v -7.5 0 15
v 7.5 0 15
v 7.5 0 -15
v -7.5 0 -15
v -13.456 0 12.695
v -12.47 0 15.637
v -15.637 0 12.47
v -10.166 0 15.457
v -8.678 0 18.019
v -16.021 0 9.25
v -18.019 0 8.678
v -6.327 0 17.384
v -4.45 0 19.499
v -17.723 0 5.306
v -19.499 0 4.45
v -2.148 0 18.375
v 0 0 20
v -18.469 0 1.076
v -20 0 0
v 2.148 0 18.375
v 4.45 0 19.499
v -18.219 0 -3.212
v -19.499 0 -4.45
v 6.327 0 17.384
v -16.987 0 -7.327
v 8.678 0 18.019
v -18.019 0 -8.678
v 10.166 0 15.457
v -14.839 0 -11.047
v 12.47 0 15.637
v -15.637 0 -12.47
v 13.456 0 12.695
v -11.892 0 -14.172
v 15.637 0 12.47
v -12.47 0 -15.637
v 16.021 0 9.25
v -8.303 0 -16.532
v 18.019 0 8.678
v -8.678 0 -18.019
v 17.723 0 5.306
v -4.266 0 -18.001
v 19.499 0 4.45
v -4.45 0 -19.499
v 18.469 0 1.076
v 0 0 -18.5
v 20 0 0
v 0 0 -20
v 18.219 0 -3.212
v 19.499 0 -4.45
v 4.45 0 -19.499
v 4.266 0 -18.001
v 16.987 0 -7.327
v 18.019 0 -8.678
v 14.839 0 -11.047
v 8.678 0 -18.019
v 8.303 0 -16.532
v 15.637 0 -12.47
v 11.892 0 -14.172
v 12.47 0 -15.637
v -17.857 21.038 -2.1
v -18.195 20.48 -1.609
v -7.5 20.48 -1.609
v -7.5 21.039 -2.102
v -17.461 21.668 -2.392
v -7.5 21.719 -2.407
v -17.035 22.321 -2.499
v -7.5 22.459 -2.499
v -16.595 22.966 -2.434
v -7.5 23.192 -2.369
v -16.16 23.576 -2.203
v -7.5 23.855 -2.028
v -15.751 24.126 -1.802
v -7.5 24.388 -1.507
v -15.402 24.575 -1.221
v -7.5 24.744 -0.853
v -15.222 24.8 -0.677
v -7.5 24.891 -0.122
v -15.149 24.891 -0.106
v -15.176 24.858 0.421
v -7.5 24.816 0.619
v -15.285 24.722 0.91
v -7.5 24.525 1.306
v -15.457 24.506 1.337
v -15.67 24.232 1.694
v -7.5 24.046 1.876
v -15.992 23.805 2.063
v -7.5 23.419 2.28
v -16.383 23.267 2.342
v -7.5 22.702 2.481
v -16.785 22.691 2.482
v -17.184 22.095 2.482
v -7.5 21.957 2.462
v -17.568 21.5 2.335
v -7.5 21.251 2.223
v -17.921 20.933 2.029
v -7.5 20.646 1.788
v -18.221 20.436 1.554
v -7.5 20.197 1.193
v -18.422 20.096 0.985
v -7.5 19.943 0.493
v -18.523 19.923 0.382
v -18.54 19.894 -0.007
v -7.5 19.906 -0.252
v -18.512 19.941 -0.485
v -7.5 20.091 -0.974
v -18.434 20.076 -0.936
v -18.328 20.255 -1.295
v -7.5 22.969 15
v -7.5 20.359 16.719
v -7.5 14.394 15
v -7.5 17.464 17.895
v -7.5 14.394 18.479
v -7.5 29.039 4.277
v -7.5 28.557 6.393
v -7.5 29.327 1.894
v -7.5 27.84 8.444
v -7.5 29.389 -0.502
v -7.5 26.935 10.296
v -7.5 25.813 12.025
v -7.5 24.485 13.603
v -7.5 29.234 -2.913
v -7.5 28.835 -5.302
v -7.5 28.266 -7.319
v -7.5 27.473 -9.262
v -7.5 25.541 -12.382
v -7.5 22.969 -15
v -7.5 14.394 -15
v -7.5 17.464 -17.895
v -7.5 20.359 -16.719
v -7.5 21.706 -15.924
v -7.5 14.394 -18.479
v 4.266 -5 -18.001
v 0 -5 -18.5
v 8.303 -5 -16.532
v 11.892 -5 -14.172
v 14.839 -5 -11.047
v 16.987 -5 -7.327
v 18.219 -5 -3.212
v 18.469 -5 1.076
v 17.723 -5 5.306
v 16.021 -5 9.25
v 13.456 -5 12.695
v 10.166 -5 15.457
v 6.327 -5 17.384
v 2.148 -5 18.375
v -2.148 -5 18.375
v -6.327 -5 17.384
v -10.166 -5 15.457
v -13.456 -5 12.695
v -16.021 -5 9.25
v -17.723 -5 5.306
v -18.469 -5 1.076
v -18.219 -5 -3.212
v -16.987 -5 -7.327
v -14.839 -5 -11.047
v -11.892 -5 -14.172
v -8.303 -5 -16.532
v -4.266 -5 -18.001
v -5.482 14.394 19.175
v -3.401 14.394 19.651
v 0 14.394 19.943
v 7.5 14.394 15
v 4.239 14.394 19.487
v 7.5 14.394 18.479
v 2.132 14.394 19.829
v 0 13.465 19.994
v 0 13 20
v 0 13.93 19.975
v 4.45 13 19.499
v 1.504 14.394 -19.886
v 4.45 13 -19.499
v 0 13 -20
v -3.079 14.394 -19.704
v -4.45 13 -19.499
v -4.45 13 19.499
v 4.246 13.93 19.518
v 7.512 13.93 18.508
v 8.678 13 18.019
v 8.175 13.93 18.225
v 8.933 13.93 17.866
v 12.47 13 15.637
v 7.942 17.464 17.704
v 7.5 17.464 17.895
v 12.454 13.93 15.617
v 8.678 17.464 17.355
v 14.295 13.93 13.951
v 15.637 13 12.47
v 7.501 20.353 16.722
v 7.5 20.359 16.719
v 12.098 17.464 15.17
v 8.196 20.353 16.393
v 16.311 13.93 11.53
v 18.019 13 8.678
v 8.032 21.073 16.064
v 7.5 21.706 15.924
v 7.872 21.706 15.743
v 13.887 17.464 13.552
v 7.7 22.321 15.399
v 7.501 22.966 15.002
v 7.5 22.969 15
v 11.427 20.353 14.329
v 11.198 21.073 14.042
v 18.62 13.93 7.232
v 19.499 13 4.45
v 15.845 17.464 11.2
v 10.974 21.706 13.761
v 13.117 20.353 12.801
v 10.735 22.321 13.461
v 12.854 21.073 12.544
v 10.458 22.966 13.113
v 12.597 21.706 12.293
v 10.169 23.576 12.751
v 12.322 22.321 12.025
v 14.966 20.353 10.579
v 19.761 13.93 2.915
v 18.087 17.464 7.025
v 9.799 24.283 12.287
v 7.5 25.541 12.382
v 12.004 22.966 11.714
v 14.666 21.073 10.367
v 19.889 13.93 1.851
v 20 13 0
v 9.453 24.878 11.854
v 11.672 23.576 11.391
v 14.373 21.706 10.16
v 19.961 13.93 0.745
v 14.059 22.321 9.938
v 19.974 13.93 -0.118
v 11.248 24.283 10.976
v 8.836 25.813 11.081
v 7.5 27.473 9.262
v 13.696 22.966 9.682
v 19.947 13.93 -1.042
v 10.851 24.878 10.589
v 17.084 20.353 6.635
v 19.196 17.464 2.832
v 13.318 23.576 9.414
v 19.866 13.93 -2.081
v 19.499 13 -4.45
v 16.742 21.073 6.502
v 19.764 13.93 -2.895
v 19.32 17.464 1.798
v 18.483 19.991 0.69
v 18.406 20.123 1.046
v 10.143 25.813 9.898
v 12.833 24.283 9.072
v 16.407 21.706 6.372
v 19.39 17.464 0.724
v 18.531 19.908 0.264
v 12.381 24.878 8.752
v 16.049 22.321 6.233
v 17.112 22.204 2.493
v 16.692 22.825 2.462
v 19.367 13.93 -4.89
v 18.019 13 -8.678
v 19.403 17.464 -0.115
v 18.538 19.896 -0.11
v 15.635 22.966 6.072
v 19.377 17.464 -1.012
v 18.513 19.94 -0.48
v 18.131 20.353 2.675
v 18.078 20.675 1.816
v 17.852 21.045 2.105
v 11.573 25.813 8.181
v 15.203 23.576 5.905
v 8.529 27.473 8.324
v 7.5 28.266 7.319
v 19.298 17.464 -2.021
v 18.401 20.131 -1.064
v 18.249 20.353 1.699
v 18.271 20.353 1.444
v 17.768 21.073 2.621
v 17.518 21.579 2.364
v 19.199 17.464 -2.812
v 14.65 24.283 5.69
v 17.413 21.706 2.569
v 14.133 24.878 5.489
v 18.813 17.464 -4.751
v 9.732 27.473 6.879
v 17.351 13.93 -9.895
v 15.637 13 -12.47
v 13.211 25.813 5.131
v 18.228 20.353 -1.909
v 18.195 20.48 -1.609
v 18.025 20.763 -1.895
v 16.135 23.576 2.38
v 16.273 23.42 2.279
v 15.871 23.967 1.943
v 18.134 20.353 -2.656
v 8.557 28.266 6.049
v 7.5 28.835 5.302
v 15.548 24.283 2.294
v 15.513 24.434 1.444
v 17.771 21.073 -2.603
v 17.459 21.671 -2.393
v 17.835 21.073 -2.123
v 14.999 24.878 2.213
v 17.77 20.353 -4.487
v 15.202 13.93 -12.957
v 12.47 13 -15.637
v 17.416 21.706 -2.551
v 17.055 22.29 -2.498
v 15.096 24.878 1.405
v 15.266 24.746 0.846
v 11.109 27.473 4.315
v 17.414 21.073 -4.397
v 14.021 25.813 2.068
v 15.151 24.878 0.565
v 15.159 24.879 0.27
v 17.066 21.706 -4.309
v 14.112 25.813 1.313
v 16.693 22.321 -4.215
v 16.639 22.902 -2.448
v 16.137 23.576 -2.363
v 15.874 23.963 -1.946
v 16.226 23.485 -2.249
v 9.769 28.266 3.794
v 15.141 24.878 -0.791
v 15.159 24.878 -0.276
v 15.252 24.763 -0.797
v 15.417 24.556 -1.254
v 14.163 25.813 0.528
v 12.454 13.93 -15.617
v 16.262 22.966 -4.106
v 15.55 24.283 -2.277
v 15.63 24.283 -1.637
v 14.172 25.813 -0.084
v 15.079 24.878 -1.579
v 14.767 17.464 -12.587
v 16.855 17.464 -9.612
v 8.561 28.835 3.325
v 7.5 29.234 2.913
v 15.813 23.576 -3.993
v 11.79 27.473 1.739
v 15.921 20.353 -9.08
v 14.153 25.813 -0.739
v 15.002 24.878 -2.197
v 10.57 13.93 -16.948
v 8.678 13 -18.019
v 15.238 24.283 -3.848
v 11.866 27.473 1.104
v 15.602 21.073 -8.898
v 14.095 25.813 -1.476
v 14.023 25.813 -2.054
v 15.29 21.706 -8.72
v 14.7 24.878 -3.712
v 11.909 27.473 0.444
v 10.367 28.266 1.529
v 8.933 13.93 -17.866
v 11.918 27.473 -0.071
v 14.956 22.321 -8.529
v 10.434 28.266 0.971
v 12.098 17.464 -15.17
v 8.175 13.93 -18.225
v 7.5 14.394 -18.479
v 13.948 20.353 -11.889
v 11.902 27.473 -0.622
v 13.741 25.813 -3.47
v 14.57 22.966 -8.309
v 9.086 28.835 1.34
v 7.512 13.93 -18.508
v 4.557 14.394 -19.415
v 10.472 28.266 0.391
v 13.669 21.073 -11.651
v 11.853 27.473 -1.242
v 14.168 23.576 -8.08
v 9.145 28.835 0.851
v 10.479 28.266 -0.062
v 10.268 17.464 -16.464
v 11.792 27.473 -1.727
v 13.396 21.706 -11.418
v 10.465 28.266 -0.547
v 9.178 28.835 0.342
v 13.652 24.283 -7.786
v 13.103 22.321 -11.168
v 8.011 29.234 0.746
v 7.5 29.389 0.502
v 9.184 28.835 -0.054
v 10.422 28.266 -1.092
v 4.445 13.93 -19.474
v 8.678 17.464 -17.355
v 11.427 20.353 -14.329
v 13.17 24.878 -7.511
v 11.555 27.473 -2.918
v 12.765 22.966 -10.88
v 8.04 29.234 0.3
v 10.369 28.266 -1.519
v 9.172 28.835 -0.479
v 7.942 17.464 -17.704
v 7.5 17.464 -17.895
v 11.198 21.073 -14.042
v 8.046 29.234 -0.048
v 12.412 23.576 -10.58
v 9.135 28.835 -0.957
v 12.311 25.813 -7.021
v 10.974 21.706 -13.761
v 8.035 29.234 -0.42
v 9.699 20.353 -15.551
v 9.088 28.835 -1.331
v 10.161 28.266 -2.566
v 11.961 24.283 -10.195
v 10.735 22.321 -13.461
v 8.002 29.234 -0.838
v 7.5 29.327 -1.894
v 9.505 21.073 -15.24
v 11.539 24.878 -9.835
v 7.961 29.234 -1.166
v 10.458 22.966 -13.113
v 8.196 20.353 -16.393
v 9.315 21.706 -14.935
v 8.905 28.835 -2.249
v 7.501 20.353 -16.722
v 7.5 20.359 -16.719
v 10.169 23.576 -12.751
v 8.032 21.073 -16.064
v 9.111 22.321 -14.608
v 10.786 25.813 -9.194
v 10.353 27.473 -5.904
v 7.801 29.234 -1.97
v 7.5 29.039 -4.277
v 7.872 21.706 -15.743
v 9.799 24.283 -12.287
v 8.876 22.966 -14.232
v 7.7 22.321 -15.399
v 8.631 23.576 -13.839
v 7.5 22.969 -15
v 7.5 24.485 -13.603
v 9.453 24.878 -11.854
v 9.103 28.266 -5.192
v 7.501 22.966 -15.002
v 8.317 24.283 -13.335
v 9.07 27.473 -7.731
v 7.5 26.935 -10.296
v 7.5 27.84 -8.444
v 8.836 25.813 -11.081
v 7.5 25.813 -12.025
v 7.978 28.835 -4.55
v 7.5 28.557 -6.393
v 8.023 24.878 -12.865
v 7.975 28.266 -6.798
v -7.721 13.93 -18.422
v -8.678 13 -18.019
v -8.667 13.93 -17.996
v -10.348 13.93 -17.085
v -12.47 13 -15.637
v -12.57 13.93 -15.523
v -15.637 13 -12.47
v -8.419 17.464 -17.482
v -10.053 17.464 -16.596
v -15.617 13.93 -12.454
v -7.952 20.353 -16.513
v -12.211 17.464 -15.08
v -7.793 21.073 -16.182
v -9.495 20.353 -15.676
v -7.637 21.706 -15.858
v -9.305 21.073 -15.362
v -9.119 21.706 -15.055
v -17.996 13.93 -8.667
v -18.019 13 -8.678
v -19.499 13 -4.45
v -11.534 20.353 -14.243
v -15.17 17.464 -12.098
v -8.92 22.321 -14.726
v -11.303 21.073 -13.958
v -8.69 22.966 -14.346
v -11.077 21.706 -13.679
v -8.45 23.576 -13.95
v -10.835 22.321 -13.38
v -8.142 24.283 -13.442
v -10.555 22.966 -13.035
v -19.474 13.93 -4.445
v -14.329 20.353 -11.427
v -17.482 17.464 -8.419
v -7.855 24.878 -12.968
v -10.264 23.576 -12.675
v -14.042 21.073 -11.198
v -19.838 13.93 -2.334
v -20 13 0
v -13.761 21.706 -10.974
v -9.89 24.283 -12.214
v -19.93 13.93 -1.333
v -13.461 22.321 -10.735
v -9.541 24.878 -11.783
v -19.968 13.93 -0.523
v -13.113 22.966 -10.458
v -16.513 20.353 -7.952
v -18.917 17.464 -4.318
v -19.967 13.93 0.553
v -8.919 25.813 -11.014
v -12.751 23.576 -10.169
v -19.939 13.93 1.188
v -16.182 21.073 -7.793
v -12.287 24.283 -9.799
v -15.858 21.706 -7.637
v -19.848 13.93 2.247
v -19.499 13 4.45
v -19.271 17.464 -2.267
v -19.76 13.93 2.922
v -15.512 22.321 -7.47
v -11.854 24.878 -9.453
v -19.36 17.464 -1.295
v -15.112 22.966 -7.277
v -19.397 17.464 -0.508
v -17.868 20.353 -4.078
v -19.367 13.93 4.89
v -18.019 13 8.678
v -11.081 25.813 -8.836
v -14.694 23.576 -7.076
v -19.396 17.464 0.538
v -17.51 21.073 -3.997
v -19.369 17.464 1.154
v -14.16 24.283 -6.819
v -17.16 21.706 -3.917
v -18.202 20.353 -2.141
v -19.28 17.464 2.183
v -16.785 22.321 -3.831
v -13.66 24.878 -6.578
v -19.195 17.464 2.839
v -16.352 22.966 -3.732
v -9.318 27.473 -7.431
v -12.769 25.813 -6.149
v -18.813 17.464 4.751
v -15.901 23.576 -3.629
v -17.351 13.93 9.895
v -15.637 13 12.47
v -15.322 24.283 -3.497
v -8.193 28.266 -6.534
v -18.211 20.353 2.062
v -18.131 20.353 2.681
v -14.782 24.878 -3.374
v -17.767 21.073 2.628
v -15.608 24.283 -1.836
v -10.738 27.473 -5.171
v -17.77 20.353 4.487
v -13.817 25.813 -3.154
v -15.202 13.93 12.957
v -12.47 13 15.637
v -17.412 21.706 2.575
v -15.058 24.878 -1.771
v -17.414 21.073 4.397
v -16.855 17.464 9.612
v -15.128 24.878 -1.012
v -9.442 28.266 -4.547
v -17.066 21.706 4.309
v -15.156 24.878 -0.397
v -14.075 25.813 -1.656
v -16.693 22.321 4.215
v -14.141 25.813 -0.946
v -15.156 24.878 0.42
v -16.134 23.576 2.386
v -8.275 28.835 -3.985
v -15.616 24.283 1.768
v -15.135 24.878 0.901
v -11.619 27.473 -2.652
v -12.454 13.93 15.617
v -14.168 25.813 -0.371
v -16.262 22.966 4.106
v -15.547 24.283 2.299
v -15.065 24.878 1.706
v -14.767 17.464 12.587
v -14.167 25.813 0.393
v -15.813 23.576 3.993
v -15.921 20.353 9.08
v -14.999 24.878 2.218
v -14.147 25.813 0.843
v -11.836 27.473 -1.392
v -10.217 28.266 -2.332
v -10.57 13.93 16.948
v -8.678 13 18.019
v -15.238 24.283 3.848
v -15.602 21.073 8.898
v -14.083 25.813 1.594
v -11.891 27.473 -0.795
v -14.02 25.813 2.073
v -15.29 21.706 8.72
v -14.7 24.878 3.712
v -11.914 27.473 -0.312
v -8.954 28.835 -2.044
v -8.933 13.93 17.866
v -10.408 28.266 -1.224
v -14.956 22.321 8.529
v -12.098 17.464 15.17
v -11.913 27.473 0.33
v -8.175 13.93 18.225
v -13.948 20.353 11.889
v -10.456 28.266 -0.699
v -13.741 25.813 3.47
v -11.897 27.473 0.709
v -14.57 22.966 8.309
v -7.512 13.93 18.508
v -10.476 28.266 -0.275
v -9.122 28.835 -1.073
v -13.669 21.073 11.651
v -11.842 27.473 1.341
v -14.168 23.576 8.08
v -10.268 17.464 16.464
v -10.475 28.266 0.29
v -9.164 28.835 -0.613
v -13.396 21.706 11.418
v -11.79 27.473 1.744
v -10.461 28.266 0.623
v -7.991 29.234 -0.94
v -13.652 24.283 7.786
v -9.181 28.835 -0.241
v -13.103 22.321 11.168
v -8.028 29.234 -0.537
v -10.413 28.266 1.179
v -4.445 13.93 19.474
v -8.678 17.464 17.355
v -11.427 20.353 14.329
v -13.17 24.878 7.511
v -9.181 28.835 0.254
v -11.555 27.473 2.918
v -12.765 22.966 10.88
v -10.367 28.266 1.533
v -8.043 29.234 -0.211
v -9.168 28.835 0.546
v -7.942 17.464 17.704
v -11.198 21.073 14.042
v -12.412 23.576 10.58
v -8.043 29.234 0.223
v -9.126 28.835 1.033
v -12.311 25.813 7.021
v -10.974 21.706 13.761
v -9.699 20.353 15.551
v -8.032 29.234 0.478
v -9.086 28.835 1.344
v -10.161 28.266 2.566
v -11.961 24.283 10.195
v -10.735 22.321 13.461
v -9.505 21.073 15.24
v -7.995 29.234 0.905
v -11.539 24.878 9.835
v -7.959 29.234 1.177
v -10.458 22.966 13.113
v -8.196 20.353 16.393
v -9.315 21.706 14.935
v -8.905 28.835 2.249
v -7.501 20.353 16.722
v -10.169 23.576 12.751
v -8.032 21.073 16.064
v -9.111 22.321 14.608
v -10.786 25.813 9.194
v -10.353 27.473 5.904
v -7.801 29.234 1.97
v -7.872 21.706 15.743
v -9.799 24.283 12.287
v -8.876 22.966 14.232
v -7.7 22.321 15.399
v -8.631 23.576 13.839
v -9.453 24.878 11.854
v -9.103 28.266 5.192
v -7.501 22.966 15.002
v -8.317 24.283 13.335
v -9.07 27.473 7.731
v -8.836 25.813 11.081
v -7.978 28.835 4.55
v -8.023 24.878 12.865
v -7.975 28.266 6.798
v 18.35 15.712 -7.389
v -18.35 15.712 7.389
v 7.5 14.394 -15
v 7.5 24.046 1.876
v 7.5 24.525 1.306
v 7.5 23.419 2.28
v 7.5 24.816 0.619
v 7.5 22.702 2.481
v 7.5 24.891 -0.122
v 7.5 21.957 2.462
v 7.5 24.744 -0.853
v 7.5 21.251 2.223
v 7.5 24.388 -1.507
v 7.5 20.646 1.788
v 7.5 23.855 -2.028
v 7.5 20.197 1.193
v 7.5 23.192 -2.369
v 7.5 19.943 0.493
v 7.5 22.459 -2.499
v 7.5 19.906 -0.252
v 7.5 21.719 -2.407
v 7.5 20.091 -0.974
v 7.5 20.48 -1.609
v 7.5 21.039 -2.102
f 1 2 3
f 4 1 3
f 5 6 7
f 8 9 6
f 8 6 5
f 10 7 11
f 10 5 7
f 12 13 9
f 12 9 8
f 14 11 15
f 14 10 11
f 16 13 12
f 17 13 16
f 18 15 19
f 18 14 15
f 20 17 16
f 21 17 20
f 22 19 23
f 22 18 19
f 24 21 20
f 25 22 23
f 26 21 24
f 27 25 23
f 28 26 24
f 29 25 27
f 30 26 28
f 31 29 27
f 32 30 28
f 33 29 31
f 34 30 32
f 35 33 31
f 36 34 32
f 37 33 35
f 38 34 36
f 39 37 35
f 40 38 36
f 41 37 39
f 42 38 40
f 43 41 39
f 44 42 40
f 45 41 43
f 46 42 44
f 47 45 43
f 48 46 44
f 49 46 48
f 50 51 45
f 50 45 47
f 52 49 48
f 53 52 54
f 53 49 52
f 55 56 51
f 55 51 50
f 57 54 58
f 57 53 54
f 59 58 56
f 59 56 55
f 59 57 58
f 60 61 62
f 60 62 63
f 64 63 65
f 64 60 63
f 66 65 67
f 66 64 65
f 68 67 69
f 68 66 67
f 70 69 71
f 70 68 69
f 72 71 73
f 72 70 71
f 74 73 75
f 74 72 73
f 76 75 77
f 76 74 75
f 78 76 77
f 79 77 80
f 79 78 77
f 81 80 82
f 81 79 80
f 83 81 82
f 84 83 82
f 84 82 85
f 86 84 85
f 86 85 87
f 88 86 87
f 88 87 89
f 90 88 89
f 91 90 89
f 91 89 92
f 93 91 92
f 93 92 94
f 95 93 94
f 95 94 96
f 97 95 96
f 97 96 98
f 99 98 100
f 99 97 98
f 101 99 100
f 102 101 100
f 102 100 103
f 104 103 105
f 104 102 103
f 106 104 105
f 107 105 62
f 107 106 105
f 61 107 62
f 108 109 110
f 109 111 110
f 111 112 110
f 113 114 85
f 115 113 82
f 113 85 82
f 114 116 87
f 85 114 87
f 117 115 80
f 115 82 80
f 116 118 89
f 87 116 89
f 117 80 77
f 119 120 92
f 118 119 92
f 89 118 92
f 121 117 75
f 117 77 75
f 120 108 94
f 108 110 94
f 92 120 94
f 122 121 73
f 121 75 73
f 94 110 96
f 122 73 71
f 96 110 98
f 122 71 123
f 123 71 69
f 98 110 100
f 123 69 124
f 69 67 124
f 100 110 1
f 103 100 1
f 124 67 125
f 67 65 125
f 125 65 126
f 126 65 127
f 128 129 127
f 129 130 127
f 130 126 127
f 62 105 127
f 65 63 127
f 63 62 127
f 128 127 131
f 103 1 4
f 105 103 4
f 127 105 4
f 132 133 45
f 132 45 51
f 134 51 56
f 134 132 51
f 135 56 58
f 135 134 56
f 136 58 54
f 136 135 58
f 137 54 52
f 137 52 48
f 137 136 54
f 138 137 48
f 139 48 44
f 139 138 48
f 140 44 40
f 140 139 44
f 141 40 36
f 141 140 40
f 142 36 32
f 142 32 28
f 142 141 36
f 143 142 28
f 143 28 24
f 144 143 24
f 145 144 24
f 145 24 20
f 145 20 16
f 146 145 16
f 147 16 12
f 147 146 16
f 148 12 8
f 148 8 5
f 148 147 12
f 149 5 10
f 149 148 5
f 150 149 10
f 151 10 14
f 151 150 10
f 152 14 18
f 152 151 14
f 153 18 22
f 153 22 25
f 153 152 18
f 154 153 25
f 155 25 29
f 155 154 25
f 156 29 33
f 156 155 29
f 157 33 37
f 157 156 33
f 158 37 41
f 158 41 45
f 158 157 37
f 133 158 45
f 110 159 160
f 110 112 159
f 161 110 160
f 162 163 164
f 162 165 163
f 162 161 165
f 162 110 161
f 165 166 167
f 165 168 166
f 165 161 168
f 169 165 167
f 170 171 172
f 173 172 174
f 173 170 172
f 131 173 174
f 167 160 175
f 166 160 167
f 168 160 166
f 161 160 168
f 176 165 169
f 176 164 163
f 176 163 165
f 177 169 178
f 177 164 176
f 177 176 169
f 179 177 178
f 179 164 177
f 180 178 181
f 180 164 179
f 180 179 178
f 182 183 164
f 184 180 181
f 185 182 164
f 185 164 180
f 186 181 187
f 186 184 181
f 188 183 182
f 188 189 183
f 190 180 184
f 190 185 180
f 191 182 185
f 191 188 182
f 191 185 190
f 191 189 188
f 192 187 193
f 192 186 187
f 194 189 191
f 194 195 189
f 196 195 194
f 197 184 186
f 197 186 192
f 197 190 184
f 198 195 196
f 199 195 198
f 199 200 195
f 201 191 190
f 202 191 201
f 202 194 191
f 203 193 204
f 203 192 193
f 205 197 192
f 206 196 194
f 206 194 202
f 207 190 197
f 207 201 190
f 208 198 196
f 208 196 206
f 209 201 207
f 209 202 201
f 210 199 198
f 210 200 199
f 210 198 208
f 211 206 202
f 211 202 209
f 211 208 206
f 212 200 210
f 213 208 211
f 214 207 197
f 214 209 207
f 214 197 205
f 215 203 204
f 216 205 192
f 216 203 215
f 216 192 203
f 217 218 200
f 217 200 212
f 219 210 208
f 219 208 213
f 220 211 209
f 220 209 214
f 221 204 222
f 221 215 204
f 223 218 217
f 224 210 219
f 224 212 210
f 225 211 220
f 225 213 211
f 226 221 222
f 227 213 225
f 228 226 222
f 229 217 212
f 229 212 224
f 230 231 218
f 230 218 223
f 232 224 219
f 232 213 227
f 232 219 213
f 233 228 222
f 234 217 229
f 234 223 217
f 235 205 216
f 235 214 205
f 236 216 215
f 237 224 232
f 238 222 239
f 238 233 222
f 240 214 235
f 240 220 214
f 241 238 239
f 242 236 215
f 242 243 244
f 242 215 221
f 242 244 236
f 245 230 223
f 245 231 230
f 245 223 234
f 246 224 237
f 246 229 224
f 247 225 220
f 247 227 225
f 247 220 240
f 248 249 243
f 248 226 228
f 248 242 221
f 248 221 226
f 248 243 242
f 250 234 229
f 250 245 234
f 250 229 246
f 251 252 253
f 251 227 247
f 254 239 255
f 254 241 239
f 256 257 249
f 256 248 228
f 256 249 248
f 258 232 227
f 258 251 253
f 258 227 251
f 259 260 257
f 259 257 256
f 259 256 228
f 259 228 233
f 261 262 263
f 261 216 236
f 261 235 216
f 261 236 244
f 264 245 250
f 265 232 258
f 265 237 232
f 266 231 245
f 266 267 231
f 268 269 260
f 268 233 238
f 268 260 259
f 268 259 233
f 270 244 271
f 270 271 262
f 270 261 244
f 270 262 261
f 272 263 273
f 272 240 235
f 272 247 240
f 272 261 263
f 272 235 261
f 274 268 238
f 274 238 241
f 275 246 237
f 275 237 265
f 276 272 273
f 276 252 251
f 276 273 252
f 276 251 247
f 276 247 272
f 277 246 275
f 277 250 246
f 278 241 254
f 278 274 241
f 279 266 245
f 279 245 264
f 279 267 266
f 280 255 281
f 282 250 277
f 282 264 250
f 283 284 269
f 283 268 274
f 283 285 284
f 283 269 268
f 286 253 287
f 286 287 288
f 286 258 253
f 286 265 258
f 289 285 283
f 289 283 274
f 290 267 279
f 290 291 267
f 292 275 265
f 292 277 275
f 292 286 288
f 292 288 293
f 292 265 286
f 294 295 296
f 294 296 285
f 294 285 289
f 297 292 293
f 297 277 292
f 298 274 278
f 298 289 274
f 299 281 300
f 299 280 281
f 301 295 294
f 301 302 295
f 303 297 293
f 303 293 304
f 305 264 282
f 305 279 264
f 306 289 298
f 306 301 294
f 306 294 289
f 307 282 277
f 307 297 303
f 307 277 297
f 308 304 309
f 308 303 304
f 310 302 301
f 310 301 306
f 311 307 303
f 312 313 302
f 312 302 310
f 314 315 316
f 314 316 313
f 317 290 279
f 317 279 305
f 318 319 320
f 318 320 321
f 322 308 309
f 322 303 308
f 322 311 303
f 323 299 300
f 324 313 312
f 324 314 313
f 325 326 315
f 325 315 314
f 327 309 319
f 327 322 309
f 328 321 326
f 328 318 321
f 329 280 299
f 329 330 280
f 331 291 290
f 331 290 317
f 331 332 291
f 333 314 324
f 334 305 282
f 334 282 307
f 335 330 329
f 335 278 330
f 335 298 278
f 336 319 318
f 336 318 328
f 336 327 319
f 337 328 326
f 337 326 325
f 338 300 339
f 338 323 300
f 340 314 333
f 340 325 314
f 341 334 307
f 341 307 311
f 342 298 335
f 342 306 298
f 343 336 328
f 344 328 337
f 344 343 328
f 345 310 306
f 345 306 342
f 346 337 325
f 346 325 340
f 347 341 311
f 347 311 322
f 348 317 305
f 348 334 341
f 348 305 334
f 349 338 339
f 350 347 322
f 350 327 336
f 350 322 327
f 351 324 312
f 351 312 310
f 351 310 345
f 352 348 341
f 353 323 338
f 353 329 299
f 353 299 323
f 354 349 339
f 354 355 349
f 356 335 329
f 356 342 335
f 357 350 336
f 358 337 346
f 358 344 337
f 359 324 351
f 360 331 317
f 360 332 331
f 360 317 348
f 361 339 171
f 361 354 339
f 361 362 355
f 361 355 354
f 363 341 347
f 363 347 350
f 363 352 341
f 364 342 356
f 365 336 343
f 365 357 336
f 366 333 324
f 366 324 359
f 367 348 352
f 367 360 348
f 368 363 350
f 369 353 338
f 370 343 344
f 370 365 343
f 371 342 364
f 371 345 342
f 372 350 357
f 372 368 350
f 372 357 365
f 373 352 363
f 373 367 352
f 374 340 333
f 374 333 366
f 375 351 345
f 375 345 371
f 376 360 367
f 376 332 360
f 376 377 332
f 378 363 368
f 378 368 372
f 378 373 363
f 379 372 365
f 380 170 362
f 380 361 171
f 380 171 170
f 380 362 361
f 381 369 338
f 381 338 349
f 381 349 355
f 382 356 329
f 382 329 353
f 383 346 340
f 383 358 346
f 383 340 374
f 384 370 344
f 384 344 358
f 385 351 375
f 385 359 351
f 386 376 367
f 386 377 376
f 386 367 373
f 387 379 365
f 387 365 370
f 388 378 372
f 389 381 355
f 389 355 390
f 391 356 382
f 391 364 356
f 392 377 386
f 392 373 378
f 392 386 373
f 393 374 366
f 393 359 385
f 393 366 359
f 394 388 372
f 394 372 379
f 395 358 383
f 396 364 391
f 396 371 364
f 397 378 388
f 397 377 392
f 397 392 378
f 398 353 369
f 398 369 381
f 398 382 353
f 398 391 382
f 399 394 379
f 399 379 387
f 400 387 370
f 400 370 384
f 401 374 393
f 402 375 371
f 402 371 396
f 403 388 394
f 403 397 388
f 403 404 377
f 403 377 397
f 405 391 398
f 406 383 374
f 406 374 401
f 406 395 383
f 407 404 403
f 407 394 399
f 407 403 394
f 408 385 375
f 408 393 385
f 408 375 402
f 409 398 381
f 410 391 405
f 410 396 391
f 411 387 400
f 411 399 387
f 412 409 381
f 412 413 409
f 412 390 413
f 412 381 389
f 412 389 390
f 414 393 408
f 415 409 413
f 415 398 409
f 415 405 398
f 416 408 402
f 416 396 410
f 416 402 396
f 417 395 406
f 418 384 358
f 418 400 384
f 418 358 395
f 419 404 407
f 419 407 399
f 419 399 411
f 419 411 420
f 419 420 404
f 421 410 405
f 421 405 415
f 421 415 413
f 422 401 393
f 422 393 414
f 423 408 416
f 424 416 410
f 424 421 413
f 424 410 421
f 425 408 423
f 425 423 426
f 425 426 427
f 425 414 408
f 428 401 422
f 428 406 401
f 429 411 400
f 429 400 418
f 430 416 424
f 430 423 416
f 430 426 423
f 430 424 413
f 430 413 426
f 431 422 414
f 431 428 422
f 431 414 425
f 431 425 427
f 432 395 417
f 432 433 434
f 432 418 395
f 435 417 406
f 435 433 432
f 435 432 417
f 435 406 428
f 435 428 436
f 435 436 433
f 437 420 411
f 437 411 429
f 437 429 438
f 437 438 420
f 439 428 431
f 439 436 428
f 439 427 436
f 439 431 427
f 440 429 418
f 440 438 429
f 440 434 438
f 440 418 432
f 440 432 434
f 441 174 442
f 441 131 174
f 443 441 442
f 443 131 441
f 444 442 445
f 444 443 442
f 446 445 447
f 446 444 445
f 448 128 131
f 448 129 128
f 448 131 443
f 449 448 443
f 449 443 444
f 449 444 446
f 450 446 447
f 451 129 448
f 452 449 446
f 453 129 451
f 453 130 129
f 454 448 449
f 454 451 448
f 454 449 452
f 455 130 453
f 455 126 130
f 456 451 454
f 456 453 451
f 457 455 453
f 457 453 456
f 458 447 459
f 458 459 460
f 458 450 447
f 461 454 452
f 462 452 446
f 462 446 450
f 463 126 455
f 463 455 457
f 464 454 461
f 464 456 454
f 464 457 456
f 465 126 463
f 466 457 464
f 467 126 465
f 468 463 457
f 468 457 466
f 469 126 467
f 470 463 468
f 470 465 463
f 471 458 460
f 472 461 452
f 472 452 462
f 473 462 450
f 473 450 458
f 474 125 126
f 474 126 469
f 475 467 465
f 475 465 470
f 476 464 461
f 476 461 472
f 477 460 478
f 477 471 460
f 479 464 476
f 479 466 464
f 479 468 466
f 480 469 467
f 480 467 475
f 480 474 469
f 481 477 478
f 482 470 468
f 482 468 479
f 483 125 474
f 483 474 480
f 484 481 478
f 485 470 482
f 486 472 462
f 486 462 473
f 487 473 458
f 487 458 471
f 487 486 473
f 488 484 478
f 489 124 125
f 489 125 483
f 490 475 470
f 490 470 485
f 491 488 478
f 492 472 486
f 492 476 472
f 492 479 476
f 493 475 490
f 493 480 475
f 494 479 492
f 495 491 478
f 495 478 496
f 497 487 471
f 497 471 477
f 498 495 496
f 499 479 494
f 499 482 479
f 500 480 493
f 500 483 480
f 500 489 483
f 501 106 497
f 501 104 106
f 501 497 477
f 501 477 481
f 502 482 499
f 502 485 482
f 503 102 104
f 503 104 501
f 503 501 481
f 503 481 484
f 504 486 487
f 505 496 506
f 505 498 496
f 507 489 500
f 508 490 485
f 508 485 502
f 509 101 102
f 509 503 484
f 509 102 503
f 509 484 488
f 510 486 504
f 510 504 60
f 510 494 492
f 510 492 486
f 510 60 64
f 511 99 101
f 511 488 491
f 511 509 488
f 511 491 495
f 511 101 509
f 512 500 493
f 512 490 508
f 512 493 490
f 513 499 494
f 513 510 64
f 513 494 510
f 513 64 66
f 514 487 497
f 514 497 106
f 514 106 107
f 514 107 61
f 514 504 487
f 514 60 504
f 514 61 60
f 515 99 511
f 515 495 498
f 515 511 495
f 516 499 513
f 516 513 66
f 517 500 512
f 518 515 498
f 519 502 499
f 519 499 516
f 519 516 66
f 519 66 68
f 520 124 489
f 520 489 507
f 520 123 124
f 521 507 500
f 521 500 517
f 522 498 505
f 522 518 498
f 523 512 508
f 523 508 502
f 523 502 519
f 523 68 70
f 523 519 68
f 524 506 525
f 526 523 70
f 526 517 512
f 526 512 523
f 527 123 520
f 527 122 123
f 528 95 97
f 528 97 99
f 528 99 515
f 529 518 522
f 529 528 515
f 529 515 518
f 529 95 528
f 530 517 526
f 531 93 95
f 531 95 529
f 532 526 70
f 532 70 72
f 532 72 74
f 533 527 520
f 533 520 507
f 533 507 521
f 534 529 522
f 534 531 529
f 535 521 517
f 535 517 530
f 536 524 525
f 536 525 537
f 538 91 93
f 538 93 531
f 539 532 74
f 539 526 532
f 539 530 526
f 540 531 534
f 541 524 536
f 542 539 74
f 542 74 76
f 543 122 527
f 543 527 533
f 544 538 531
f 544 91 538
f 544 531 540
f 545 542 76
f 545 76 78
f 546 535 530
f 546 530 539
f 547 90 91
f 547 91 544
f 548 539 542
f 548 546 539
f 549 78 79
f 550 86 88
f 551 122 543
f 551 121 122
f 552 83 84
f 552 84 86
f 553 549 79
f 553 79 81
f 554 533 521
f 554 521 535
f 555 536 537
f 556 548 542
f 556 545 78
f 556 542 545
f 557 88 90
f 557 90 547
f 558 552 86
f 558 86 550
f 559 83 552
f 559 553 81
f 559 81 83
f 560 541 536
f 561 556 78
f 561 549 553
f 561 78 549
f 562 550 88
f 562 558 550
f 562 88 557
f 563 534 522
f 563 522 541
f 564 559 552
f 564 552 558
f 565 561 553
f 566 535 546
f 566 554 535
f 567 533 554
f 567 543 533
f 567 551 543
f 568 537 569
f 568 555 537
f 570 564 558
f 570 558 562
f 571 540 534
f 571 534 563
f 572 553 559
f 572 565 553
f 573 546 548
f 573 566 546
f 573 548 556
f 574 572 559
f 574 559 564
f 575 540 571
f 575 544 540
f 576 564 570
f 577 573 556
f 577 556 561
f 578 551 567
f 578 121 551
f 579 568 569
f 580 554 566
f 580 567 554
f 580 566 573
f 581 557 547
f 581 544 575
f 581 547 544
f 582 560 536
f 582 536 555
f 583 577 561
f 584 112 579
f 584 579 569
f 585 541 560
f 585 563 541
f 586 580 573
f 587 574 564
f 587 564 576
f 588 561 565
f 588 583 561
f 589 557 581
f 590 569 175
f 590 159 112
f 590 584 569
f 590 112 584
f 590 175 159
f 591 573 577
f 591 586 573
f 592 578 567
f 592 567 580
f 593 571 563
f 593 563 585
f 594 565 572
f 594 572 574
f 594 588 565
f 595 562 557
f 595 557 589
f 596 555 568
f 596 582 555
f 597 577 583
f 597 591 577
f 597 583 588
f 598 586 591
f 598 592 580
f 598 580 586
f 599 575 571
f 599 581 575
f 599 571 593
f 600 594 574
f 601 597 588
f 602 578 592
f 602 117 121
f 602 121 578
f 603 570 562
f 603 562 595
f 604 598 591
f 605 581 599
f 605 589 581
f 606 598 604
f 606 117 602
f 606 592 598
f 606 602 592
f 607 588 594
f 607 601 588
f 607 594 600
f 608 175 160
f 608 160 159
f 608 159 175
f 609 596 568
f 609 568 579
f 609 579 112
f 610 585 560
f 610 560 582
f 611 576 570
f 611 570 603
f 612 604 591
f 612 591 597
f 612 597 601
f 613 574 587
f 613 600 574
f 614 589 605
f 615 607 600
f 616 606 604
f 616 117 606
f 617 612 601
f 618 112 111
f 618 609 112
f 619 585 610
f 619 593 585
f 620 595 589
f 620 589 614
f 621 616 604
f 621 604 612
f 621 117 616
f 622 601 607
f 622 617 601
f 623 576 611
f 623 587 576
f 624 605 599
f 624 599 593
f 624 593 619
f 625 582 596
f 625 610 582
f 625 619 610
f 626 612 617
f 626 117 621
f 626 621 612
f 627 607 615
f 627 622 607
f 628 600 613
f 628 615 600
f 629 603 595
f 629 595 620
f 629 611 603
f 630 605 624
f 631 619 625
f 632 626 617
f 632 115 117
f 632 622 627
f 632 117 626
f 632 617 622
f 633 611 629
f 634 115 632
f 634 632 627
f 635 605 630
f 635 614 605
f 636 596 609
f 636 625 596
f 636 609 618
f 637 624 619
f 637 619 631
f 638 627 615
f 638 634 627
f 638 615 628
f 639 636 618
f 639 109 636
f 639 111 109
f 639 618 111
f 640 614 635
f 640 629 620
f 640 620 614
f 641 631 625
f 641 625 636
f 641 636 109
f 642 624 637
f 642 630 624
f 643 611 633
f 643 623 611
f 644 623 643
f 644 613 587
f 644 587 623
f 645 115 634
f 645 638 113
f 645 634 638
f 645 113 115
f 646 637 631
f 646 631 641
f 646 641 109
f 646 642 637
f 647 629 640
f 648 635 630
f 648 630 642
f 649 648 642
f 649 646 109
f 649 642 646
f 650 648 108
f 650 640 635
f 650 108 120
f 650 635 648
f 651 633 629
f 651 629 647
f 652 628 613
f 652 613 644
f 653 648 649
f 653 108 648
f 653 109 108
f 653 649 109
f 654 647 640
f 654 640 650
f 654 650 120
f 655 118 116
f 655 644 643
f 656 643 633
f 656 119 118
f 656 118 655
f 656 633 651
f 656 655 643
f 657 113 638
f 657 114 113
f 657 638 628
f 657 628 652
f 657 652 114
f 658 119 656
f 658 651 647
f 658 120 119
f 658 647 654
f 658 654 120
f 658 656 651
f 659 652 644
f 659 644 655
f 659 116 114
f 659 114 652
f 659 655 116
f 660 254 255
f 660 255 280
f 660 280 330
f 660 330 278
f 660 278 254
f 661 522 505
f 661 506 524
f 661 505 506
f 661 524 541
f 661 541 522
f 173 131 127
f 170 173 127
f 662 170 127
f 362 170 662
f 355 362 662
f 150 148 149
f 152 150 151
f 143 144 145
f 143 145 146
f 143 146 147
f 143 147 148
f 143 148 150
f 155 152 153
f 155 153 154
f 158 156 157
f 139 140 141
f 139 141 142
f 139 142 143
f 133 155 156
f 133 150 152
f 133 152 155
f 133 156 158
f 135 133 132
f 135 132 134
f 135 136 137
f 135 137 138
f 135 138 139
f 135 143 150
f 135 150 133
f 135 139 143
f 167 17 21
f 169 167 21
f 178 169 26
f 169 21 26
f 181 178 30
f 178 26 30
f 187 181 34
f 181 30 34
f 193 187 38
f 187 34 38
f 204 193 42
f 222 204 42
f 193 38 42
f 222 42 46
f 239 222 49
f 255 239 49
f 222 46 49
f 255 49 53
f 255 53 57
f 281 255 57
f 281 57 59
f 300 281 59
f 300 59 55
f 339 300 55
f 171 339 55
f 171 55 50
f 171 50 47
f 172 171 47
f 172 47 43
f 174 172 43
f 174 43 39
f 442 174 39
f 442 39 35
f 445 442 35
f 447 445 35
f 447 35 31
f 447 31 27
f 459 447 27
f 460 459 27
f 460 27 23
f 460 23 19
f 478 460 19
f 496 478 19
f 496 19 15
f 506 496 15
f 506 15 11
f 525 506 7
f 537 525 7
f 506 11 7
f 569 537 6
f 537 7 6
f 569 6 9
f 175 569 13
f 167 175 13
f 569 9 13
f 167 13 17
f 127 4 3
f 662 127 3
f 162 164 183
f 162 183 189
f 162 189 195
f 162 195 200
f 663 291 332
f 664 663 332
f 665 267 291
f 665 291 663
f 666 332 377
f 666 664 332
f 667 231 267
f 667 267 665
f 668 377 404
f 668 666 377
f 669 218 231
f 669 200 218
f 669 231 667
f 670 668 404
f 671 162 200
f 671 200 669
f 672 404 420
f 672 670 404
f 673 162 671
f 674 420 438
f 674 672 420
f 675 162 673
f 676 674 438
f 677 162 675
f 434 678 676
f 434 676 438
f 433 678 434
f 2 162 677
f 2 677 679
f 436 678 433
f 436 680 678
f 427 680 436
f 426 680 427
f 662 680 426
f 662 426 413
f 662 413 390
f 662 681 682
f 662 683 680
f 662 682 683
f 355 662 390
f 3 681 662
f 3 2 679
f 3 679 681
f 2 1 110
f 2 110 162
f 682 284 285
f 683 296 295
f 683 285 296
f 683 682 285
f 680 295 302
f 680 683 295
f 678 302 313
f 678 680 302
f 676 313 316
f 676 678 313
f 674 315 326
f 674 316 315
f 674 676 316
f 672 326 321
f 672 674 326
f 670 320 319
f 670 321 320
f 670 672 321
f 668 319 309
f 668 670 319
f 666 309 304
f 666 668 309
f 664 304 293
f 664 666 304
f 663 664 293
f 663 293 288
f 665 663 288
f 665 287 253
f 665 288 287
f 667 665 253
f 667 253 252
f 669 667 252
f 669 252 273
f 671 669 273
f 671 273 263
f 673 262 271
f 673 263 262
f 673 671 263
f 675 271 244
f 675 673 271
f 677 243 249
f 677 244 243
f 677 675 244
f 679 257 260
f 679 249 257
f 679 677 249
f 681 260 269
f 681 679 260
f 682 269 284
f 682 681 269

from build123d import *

# Parameters (mm, degrees)
SKETCH2_R               = 20
SKETCH2_W               = 15
SKETCH2_H               = 30
BOSS_EXTRUDE1_DEPTH     = 30
FILLET1_R               = 17
CUT_EXTRUDE1_DEPTH      = 30
CUT_EXTRUDE1_DEPTH_BACK = 30
SKETCH3_W               = 15
SKETCH3_H               = 15
BOSS_EXTRUDE3_START     = 5
SKETCH4_R               = 20
BOSS_EXTRUDE3_DEPTH     = 5
SKETCH5_R               = 20
SKETCH5_R_2             = 18.5
CUT_EXTRUDE2_DEPTH      = 5
CUT_EXTRUDE3_DEPTH      = 20
CUT_EXTRUDE3_DEPTH_BACK = 40
SKETCH6_R               = 2.5


with BuildPart() as part:
    # Sketch2 → Boss-Extrude1 (new body)
    with BuildSketch(Plane(origin=(0, 0, 0), x_dir=(1, 0, 0), z_dir=(0, 1, 0))):
        with Locations(Location((0, 0, 0), (0, 0, 270))):
            Circle(SKETCH2_R)
        Rectangle(SKETCH2_W, SKETCH2_H, mode=Mode.SUBTRACT)
    extrude(amount=BOSS_EXTRUDE1_DEPTH)

    # Fillet1
    # the kernel refuses this fillet: 17 mm, written as the material it takes off along each edge
    with BuildSketch(Plane(origin=(0, 30, 0), x_dir=(0, 0, 1), z_dir=(-1, 0, 0))) as fillet1_piece_1:
        with BuildLine():
            CenterArc((20 - FILLET1_R, -FILLET1_R), FILLET1_R, 0, 90)
            Line((20 - FILLET1_R, 0), (20, 0))
            Line((20, 0), (20, -FILLET1_R))
        make_face()
    revolve(axis=Axis((0, 30, 0), (0, 1, 0)), mode=Mode.SUBTRACT)

    # Sketch3 → Cut-Extrude1 (cut, two sides: drawn at the far end of the back side and taken through both)
    with BuildSketch(Plane.XY.offset(-CUT_EXTRUDE1_DEPTH_BACK)):
        with Locations((0, 21.893596311)):
            Rectangle(SKETCH3_W, SKETCH3_H)
    extrude(amount=CUT_EXTRUDE1_DEPTH + CUT_EXTRUDE1_DEPTH_BACK, mode=Mode.SUBTRACT)

    # Sketch4 → Boss-Extrude3 (add)
    with BuildSketch(Plane.XZ.offset(BOSS_EXTRUDE3_START)):
        with Locations(Location((0, 0, 0), (0, 0, 270))):
            Circle(SKETCH4_R)
    extrude(amount=-BOSS_EXTRUDE3_DEPTH)

    # Sketch5 → Cut-Extrude2 (cut)
    with BuildSketch(Plane.XZ.offset(5)):
        with Locations(Location((0, 0, 0), (0, 0, 270))):
            Circle(SKETCH5_R)
        with Locations(Location((0, 0, 0), (0, 0, 270))):
            Circle(SKETCH5_R_2, mode=Mode.SUBTRACT)
    extrude(amount=-CUT_EXTRUDE2_DEPTH, mode=Mode.SUBTRACT)

    # Sketch6 → Cut-Extrude3 (cut, two sides: drawn at the far end of the back side and taken through both)
    with BuildSketch(Plane(origin=(0, 0, 0), x_dir=(0, 0, -1), z_dir=(1, 0, 0)).offset(-CUT_EXTRUDE3_DEPTH_BACK)):
        with Locations(Location((0, 22.393596311, 0), (0, 0, 310.060861392))):
            Circle(SKETCH6_R)
    extrude(amount=CUT_EXTRUDE3_DEPTH + CUT_EXTRUDE3_DEPTH_BACK, mode=Mode.SUBTRACT)


solid = part.part
